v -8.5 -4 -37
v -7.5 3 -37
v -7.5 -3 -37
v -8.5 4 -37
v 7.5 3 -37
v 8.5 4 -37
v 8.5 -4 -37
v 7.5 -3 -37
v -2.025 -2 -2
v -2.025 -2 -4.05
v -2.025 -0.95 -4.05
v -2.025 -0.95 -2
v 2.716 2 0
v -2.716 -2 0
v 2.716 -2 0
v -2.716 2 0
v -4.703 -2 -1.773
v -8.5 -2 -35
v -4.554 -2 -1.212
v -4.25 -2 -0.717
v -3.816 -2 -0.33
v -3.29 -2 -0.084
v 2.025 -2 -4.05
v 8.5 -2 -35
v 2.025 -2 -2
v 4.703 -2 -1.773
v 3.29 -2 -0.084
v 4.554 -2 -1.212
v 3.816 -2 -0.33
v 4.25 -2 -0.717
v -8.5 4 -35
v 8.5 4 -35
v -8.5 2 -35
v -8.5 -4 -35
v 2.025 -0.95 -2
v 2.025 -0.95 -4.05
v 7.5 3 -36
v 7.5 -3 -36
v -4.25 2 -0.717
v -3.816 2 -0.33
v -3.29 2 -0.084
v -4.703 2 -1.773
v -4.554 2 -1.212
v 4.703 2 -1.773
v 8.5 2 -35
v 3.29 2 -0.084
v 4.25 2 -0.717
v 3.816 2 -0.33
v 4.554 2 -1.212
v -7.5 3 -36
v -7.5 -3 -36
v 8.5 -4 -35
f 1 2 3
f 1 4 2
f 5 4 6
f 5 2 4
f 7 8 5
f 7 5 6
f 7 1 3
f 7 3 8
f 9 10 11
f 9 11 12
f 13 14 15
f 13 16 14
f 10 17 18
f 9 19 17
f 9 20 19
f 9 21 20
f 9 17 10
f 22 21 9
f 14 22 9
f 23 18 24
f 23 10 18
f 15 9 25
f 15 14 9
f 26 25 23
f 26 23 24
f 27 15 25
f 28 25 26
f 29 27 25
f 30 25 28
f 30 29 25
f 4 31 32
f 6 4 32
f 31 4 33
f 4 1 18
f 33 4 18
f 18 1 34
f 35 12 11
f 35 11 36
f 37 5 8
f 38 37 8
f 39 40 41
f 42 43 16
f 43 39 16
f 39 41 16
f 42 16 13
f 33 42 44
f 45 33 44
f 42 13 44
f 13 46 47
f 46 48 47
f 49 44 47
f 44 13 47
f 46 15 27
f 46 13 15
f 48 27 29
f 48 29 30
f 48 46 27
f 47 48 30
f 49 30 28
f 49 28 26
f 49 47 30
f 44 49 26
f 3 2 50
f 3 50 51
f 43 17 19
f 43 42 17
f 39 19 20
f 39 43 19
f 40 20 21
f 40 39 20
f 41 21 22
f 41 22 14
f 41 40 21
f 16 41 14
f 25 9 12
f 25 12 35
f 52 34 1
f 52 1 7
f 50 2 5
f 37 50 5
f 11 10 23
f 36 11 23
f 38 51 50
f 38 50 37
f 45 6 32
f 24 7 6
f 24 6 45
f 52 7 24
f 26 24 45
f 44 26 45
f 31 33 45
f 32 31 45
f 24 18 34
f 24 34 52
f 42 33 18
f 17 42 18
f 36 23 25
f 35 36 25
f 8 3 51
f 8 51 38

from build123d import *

# Parameters (mm, degrees)
F0_W          = 9
F0_H          = 4
F2_W          = 17
F2_H          = 4
F4_DEPTH      = 2
F5_W          = 17
F5_H          = 2
F6_DEPTH      = 2
F6_DEPTH_BACK = 6
F7_W          = 4.05
F7_H          = 2.05
F8_DEPTH      = 1.05
F9_W          = 14.9999996647
F9_H          = 5.9999996647
F10_DEPTH     = 1
F11_R         = 2


with BuildPart() as f3:
    # F0 (on Top) → F3 section 0
    with BuildSketch(Plane.XY):
        Rectangle(F0_W, F0_H)
    # F2 (on offset) → F3 section 1
    with BuildSketch(Plane.XY.offset(-35)):
        Rectangle(F2_W, F2_H)
    loft()

    # F4 (add): a face of the model
    f4_faces = [f3.faces().sort_by_distance(p)[0] for p in [
        (0, 0, -35),
    ]]
    extrude(f4_faces, amount=F4_DEPTH)

    # F5 (on face) → F6 (join, two sides)
    with BuildSketch(Plane.XZ.offset(2)) as f6_sk:
        with Locations((0, -36)):
            Rectangle(F5_W, F5_H)
    extrude(amount=F6_DEPTH)
    extrude(f6_sk.sketch, amount=-F6_DEPTH_BACK)

    # F7 (on face) → F8 (cut)
    with BuildSketch(Plane.XZ.offset(2)):
        with Locations((0, -3.025)):
            Rectangle(F7_W, F7_H)
    extrude(amount=-F8_DEPTH, mode=Mode.SUBTRACT)

    # F9 (on face) → F10 (cut)
    with BuildSketch(Plane(origin=(0, 0, -37), x_dir=(1, 0, 0), z_dir=(0, 0, -1))):
        Rectangle(F9_W, F9_H)
    extrude(amount=-F10_DEPTH, mode=Mode.SUBTRACT)

    # F11
    f11_edges = [f3.edges().sort_by_distance(p)[0] for p in [
        (-4.5, 0, 0),
        (4.5, 0, 0),
    ]]
    fillet(f11_edges, radius=F11_R)


solid = f3.part
